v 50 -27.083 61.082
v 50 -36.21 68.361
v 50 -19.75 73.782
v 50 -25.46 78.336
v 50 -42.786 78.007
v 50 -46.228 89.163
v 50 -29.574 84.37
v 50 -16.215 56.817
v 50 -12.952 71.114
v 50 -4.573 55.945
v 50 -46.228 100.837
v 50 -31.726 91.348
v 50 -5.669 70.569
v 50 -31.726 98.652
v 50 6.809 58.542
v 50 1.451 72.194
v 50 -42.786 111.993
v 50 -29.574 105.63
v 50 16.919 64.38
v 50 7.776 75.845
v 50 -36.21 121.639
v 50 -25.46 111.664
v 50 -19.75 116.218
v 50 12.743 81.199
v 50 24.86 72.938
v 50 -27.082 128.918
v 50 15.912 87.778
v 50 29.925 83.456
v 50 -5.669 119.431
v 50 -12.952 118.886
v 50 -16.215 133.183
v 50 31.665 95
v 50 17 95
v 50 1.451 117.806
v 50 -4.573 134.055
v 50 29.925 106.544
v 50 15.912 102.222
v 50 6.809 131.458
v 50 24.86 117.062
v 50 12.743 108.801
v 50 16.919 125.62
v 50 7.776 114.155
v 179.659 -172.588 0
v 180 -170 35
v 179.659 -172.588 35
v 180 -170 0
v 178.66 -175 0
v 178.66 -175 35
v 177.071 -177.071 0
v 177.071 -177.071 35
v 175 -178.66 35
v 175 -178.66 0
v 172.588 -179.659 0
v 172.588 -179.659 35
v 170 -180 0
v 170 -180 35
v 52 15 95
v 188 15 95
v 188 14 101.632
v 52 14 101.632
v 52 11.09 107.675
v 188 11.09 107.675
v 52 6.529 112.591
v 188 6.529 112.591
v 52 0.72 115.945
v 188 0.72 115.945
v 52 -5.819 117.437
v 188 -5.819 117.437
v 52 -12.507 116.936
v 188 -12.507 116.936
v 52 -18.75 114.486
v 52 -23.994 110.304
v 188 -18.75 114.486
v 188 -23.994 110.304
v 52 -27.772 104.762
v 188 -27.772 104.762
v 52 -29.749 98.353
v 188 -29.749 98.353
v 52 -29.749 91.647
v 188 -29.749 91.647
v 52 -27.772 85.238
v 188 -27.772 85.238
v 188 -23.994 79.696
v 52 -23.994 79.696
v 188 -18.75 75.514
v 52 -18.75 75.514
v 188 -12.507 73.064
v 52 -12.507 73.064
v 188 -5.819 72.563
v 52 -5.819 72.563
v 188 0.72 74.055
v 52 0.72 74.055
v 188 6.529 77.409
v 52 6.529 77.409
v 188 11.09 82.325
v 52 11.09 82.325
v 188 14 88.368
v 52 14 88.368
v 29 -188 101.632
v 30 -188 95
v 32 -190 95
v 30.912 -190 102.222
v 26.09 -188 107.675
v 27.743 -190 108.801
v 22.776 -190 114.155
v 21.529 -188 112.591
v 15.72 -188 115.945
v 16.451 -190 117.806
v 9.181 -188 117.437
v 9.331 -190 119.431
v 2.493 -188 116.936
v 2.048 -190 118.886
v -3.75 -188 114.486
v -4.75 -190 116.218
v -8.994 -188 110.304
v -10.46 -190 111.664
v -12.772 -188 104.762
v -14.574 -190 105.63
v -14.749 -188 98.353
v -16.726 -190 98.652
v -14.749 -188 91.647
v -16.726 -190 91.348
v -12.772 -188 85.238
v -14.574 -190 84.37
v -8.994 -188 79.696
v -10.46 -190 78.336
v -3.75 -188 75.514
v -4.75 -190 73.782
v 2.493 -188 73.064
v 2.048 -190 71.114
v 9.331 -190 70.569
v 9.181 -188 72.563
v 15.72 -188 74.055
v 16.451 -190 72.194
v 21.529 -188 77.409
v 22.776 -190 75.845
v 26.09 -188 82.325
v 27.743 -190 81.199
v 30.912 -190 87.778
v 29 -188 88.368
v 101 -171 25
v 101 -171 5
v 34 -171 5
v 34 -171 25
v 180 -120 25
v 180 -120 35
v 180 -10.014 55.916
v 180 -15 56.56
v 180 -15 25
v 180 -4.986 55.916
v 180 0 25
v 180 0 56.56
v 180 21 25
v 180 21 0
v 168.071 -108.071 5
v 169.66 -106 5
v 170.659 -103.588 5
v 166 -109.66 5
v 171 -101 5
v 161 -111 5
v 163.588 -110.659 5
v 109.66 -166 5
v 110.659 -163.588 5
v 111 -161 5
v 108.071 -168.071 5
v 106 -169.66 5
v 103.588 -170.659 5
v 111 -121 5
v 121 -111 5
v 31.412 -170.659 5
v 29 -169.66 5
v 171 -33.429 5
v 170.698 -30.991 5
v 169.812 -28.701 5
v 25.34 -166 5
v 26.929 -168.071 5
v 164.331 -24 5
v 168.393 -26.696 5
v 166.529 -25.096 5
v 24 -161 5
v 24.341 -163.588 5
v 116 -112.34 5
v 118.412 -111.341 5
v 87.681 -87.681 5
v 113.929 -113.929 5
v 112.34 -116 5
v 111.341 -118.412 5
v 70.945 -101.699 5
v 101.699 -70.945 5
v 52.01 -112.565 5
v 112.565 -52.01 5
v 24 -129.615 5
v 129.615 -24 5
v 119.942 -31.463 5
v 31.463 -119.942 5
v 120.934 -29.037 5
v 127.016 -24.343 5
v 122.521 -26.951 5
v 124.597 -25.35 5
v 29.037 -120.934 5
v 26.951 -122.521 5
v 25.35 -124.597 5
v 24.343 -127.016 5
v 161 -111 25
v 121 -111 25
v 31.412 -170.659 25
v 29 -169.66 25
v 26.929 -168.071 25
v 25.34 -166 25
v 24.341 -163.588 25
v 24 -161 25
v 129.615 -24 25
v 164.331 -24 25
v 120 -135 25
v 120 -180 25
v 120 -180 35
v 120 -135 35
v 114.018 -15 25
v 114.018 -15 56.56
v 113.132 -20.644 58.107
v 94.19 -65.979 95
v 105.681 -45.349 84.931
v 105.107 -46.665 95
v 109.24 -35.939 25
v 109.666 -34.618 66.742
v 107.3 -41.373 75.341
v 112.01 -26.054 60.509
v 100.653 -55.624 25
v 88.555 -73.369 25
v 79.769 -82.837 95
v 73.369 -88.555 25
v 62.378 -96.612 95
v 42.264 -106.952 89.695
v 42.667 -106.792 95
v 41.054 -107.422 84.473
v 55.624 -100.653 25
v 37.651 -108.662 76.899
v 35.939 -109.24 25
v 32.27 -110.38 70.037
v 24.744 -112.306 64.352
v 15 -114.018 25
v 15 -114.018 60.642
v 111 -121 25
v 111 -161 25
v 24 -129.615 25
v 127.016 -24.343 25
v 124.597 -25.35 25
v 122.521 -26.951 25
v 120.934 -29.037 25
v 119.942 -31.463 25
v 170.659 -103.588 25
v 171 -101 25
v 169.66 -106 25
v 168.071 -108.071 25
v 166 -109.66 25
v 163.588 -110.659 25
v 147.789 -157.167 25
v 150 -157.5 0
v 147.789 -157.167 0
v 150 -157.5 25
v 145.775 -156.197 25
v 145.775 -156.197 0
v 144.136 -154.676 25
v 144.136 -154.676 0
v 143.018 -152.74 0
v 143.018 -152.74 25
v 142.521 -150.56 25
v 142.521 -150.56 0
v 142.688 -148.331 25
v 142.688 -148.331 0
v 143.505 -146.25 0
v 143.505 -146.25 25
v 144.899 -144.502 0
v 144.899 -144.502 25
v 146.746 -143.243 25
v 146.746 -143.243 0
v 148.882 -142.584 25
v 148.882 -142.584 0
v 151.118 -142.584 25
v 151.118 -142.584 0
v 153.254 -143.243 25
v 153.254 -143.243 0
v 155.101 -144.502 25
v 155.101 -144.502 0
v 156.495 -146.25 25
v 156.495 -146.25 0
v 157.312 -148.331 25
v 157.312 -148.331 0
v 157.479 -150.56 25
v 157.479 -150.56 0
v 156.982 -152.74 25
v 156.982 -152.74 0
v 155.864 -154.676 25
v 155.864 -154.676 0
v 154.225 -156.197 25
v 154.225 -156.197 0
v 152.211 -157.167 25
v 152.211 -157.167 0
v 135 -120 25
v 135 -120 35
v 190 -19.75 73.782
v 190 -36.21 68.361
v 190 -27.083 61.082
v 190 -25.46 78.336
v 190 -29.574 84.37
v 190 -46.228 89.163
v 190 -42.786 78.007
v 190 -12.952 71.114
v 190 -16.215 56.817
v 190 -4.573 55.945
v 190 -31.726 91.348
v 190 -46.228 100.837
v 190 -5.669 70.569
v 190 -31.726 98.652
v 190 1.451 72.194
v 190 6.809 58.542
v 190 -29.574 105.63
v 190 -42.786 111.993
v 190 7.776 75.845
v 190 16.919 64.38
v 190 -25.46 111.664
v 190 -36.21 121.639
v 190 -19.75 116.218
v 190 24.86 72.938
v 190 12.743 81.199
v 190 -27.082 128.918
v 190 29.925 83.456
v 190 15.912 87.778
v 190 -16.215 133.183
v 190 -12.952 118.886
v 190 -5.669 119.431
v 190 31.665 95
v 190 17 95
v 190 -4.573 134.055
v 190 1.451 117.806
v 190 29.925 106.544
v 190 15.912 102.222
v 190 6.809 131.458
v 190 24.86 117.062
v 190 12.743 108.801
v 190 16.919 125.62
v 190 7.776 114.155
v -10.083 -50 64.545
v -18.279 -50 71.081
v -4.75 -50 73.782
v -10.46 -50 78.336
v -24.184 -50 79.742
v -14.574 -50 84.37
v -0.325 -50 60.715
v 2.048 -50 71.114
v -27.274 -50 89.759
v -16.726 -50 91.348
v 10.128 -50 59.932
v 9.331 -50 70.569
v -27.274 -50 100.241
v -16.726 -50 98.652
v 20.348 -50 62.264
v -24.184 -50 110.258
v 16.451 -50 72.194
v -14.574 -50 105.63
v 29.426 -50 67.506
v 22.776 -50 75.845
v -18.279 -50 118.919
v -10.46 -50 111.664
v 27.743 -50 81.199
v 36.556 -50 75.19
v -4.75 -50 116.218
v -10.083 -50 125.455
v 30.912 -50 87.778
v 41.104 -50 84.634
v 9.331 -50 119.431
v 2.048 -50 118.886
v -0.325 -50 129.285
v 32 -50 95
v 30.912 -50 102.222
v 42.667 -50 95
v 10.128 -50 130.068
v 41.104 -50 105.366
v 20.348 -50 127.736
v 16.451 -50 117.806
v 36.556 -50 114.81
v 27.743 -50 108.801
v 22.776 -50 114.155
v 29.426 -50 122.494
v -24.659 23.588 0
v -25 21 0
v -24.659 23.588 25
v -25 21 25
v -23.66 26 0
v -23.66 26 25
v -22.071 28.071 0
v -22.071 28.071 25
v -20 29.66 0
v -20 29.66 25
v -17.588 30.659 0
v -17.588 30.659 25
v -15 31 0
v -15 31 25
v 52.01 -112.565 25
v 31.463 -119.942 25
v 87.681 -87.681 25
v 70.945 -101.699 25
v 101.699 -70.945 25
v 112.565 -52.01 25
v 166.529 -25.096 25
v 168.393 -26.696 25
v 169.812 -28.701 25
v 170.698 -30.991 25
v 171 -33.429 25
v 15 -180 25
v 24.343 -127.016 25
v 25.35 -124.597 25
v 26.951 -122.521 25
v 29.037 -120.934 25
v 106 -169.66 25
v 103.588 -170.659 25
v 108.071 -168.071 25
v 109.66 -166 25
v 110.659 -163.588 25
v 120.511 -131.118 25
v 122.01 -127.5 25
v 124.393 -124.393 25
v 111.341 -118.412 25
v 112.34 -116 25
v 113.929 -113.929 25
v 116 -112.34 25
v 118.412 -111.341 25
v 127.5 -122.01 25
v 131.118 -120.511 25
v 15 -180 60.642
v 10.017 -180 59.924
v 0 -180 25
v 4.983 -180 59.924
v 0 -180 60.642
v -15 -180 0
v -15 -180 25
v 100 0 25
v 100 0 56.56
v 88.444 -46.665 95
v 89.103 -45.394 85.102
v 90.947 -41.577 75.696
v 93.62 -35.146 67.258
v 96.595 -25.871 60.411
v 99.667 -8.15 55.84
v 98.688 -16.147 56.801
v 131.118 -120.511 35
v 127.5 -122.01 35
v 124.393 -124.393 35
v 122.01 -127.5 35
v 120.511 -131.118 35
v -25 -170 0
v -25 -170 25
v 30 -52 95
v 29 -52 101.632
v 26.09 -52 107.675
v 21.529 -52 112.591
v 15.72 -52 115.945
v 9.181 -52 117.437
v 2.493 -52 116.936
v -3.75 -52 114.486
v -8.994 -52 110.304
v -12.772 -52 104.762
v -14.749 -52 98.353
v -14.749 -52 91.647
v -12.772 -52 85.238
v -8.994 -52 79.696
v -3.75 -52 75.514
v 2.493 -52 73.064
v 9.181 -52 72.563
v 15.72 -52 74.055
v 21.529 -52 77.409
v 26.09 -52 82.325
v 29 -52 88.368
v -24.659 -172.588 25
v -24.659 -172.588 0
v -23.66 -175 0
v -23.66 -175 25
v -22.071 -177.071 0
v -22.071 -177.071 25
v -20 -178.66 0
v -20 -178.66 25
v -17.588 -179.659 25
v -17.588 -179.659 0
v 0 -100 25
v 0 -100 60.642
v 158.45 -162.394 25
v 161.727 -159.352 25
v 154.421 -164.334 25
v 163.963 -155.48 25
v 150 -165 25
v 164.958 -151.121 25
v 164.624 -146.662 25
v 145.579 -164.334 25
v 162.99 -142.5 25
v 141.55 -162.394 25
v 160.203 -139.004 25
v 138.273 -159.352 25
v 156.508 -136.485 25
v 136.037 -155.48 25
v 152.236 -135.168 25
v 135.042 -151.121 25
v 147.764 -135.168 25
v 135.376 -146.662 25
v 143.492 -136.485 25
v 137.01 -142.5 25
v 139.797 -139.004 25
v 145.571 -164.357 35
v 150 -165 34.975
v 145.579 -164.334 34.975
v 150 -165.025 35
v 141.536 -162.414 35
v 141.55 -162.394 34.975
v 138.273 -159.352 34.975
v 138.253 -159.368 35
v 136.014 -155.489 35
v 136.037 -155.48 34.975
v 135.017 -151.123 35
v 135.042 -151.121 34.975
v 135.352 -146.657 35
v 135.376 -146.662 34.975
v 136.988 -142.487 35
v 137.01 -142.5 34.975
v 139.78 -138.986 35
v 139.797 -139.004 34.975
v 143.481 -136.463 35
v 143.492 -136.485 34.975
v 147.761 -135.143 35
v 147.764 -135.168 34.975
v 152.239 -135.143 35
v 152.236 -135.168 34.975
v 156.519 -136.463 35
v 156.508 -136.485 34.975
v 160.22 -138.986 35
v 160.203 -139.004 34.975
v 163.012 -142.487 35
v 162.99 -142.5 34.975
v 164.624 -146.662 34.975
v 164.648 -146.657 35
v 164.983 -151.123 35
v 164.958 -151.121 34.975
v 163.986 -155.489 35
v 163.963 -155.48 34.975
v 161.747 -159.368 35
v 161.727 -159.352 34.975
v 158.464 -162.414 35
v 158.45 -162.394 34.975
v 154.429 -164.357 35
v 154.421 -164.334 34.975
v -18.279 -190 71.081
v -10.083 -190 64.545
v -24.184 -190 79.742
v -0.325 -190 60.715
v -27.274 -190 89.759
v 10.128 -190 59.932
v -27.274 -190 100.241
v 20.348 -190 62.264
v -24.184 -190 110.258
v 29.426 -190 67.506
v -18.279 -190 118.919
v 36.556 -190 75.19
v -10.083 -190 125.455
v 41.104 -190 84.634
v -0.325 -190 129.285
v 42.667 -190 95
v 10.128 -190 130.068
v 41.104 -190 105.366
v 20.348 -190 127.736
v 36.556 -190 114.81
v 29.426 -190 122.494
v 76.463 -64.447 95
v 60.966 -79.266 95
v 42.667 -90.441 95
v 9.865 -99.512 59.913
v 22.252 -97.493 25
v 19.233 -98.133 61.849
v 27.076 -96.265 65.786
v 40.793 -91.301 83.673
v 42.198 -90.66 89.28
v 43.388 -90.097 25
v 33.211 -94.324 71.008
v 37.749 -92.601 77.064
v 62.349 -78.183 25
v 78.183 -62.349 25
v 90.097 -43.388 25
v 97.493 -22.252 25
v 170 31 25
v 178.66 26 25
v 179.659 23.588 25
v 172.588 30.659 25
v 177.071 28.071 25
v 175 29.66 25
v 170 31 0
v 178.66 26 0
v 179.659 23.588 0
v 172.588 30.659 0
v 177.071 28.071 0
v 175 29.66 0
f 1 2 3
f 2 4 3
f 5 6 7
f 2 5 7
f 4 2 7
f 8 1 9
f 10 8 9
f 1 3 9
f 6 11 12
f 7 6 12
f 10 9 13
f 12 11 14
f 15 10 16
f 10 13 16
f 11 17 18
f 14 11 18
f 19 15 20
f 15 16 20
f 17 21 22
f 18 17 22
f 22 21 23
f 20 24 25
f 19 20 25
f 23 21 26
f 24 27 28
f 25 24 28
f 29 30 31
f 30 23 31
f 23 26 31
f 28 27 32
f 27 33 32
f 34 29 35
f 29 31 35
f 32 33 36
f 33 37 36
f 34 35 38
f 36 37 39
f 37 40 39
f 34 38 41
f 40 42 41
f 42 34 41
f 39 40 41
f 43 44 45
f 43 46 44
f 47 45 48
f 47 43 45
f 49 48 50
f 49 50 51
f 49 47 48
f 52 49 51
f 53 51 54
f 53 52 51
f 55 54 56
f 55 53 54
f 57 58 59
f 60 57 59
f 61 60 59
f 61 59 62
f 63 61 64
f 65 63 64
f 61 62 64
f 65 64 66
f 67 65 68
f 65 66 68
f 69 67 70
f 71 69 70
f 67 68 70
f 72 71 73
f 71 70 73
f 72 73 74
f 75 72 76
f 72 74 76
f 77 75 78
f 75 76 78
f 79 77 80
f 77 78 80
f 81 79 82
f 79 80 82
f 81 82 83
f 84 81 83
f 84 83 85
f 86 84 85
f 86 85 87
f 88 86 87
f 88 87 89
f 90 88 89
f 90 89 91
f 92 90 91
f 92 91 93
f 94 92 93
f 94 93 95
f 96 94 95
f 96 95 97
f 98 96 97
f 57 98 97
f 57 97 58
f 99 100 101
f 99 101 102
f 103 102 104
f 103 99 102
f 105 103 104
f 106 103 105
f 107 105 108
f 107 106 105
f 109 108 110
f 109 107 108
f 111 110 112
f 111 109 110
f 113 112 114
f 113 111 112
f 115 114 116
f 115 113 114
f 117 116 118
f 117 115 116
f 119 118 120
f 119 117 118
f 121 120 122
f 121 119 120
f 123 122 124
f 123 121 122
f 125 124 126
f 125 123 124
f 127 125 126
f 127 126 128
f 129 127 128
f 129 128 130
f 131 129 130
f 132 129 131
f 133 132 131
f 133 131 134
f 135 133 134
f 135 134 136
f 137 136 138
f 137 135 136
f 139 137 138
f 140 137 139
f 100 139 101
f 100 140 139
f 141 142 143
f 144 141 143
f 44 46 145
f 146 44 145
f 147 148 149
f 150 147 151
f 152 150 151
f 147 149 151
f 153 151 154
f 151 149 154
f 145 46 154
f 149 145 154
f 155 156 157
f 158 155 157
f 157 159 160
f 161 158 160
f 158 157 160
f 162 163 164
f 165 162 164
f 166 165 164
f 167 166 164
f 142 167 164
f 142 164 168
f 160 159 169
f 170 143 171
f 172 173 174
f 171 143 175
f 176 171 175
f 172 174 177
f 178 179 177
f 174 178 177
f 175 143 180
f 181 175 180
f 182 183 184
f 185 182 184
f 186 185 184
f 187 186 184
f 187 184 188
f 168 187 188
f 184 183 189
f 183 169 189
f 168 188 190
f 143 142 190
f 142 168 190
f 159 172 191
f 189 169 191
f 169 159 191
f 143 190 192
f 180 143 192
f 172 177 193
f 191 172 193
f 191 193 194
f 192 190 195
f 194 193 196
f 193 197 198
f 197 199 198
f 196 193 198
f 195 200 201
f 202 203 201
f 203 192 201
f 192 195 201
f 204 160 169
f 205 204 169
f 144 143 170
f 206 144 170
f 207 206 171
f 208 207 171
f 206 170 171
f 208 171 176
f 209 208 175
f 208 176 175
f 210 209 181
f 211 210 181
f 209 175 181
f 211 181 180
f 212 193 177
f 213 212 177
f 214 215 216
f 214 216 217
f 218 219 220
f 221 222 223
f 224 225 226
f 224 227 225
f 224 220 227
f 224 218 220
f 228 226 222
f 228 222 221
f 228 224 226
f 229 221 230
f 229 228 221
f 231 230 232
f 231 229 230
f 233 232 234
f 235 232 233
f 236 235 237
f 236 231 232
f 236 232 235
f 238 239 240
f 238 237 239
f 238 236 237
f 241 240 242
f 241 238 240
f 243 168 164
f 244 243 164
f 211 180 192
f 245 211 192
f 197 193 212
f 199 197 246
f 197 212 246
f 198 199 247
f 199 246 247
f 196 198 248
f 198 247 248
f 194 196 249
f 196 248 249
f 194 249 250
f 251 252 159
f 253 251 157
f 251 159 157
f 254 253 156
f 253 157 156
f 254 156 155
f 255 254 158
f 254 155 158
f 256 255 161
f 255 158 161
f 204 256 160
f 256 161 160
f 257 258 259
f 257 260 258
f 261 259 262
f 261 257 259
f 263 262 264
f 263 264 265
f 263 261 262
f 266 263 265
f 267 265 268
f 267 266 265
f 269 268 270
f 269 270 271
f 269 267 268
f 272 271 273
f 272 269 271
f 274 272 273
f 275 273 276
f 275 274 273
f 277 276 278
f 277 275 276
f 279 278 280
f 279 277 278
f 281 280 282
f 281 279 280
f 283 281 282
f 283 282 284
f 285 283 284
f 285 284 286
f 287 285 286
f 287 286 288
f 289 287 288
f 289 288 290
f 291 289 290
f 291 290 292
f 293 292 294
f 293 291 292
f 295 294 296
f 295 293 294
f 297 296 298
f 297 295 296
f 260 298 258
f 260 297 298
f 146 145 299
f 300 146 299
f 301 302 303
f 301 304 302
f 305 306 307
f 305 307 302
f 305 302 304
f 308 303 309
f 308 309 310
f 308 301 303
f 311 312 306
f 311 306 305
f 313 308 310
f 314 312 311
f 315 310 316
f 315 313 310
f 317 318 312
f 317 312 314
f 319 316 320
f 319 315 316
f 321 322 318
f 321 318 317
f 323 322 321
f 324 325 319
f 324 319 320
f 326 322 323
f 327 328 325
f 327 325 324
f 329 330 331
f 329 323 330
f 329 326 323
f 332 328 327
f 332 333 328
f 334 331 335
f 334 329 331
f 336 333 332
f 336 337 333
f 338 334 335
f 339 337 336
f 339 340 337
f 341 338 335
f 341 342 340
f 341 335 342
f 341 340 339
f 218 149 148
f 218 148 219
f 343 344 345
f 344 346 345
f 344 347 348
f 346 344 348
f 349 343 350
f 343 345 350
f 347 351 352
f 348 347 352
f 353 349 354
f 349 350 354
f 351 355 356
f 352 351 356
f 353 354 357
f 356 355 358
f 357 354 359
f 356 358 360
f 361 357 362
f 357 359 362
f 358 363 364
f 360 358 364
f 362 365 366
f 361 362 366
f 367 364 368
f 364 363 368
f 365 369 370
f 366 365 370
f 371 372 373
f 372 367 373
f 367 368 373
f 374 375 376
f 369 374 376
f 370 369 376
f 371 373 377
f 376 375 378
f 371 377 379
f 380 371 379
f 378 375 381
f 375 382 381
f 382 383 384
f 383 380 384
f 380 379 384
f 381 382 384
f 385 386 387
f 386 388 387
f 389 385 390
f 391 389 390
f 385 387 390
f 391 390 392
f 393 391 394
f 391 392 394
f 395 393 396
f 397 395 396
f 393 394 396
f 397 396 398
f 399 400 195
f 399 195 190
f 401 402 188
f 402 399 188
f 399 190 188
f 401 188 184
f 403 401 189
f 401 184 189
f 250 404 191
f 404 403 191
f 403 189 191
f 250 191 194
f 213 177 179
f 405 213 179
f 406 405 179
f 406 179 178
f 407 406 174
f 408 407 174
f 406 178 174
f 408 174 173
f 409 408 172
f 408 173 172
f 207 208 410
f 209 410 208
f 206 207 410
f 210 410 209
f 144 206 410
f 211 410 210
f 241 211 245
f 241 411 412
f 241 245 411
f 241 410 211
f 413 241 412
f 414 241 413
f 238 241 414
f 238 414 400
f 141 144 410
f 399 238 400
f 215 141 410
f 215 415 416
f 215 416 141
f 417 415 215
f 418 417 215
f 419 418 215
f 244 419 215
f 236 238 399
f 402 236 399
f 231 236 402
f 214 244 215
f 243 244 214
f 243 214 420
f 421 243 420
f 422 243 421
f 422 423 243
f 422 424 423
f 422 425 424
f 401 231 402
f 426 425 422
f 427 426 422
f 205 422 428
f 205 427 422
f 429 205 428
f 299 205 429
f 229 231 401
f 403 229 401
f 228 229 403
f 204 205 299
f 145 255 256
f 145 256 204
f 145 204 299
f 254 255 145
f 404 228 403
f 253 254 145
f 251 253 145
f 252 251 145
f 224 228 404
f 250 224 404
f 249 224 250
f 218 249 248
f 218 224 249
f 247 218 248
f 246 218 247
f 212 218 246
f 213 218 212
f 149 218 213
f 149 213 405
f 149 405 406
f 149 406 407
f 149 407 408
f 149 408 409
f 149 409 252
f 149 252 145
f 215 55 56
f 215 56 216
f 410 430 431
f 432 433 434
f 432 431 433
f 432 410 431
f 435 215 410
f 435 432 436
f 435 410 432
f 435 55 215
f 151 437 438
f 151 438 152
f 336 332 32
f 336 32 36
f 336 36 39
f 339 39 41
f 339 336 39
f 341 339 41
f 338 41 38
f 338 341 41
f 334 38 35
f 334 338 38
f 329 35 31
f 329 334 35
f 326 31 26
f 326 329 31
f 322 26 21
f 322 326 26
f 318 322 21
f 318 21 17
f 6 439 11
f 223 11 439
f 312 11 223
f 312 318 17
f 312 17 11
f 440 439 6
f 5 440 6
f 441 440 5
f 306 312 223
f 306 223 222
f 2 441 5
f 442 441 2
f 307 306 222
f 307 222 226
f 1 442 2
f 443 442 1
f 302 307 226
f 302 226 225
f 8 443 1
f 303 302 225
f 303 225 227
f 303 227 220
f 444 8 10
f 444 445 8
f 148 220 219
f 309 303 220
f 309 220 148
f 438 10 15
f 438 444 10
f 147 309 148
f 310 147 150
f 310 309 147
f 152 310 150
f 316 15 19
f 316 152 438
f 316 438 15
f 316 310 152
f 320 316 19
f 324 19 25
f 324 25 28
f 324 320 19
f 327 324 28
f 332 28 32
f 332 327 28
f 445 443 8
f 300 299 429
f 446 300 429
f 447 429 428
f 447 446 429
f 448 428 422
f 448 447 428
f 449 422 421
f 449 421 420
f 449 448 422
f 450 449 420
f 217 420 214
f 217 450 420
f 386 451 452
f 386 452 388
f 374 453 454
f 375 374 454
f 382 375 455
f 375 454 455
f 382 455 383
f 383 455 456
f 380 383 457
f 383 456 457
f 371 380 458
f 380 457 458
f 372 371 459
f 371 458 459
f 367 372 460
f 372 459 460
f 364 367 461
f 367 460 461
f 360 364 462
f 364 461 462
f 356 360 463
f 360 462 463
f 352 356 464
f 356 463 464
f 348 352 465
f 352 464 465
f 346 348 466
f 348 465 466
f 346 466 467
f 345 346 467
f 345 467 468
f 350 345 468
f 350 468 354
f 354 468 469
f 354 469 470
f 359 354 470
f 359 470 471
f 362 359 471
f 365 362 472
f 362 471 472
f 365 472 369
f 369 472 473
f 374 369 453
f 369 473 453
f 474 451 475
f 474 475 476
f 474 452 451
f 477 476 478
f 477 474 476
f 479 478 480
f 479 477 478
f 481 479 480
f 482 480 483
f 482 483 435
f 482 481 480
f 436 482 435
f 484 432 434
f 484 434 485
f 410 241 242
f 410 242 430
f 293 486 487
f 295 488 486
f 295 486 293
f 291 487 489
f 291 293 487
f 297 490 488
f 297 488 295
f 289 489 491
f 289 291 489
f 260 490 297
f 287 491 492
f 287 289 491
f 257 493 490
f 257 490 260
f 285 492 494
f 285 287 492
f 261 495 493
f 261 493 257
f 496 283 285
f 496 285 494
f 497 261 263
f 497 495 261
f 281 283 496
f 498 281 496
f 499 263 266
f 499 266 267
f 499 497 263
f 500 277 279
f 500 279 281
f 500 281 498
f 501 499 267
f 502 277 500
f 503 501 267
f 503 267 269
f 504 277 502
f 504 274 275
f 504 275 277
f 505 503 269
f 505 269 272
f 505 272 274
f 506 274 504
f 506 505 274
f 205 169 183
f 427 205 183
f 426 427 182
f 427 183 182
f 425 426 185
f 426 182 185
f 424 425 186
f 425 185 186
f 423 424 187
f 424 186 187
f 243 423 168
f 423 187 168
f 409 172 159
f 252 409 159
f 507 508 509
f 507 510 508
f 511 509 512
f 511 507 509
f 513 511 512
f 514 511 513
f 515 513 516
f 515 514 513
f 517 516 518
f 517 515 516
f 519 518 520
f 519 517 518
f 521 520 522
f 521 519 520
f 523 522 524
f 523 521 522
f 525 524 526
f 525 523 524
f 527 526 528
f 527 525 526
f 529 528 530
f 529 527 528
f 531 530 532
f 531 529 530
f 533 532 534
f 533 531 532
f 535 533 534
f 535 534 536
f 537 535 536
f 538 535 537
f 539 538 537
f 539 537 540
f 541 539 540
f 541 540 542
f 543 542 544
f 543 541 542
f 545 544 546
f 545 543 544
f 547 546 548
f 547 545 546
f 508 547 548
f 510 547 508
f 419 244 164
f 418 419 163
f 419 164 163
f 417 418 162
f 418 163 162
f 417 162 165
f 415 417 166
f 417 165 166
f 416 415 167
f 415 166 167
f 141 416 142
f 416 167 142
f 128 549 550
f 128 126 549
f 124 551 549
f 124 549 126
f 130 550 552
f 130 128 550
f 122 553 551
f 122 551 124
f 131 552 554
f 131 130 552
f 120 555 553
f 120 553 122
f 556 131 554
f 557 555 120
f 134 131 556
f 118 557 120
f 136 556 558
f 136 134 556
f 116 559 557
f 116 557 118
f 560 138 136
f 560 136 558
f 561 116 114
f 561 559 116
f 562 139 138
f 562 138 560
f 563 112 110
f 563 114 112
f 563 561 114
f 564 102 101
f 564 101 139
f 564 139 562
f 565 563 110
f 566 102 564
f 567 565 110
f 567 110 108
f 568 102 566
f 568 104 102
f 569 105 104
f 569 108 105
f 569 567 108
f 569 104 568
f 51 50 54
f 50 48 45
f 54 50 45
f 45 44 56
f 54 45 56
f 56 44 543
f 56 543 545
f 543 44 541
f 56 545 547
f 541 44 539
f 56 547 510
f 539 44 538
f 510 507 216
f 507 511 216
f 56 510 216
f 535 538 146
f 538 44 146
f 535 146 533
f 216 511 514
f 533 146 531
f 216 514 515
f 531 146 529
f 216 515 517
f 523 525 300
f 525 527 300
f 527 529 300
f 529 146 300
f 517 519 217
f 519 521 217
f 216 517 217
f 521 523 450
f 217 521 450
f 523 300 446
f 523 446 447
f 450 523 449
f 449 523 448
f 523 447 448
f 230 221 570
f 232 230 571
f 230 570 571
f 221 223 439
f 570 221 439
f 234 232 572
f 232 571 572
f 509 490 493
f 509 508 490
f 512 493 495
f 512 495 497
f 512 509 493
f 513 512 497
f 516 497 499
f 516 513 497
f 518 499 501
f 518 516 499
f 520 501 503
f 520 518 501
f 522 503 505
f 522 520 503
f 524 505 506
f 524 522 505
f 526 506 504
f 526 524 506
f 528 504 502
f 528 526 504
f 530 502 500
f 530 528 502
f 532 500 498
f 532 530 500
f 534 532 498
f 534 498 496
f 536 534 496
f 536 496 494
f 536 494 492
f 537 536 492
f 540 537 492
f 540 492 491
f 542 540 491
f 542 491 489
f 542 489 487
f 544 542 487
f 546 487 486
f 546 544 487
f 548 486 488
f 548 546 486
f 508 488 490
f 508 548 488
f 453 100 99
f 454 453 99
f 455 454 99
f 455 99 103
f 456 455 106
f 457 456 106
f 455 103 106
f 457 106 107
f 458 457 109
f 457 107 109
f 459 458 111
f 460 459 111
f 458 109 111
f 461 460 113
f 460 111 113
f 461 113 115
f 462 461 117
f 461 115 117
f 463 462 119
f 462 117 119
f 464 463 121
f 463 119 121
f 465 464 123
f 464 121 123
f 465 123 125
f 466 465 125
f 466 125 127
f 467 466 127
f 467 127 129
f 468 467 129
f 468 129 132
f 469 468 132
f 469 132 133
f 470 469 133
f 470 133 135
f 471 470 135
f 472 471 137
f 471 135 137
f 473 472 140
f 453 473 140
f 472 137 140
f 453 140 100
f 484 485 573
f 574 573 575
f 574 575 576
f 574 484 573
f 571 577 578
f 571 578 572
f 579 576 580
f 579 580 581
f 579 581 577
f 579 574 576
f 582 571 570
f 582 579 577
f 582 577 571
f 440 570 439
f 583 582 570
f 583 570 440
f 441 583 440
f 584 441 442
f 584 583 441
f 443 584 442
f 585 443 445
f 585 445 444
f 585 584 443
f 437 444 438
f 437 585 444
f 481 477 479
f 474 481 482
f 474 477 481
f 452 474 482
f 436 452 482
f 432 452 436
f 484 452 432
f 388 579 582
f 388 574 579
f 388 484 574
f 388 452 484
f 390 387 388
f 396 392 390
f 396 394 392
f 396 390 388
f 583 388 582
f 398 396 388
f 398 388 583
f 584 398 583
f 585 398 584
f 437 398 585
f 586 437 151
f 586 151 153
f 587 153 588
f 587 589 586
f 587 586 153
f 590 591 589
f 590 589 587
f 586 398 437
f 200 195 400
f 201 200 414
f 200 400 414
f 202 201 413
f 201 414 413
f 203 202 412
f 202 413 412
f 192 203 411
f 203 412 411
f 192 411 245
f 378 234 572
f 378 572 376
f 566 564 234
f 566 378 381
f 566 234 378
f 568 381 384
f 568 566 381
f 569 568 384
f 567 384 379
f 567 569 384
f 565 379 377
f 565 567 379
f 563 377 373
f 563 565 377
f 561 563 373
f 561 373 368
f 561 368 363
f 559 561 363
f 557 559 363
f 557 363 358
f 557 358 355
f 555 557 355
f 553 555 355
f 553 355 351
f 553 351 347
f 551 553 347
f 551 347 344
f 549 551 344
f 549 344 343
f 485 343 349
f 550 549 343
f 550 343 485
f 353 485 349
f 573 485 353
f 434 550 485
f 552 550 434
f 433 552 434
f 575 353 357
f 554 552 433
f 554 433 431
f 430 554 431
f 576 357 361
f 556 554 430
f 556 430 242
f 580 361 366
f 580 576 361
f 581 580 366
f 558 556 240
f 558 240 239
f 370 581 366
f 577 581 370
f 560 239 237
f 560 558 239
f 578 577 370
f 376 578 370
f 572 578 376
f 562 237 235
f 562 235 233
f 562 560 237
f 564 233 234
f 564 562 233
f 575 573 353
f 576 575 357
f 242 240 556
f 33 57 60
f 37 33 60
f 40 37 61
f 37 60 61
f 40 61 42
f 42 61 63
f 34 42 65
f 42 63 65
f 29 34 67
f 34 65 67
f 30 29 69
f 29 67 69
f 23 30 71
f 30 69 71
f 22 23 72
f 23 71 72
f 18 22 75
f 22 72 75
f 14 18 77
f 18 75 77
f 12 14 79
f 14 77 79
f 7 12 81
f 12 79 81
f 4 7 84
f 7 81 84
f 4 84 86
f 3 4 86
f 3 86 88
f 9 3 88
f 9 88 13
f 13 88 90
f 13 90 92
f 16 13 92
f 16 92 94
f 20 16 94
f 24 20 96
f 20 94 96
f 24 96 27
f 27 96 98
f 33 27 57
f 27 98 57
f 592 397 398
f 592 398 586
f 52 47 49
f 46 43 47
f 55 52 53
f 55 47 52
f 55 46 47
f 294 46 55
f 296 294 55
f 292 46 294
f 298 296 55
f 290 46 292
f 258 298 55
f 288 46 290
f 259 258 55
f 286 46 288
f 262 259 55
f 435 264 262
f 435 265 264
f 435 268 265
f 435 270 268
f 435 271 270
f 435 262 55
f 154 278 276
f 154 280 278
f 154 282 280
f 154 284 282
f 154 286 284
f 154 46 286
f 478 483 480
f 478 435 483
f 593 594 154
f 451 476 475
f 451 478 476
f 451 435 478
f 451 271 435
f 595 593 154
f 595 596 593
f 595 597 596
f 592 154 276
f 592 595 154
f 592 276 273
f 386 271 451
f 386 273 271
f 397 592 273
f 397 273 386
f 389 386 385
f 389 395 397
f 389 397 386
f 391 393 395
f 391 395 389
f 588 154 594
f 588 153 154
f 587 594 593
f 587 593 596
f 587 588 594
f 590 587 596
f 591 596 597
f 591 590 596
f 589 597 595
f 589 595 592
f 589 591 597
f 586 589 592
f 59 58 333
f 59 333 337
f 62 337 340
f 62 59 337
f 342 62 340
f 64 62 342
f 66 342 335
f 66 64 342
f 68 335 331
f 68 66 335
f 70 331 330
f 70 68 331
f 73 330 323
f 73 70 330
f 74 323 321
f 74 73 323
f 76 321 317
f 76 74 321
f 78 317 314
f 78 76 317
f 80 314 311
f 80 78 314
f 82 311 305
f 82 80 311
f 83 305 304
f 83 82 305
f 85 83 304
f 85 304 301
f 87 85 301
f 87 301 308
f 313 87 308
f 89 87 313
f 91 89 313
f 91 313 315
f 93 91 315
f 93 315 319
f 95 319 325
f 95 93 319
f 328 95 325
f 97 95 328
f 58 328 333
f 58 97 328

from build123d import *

# Parameters (mm, degrees)
SKETCH1_W               = 205
SKETCH1_H               = 211
BOSS_EXTRUDE1_DEPTH     = 25
BOSS_EXTRUDE2_START     = -25
SKETCH2_W               = 60
SKETCH2_H               = 60
BOSS_EXTRUDE2_DEPTH     = 10
FILLET1_R               = 10
BOSS_EXTRUDE3_DEPTH     = 95
BOSS_EXTRUDE4_START     = 10
SKETCH5_R               = 35.166666667
BOSS_EXTRUDE4_DEPTH     = 140
SKETCH6_R               = 22.5
CUT_EXTRUDE1_DEPTH      = 140
BOSS_EXTRUDE5_START     = 10
SKETCH7_R               = 39.165
BOSS_EXTRUDE5_DEPTH     = 140
SKETCH8_R               = 22.5
CUT_EXTRUDE2_DEPTH      = 319.557726497
CUT_EXTRUDE5_DEPTH      = 35
CUT_EXTRUDE5_DEPTH_BACK = 15
CUT_EXTRUDE5_START      = -5
FILLET2_R               = 15
FILLET3_R               = 10
CHAMFER1_SIZE           = 2
CHAMFER2_SIZE           = 2


with BuildPart() as part:
    # Sketch1 → Boss-Extrude1 (new body)
    with BuildSketch(Plane.XY):
        with Locations((77.5, -74.5)):
            Rectangle(SKETCH1_W, SKETCH1_H)
    extrude(amount=BOSS_EXTRUDE1_DEPTH)

    # Sketch2 → Boss-Extrude2 (add)
    with BuildSketch(Plane(origin=(0, 0, 0), x_dir=(-1, 0, 0), z_dir=(0, 0, -1)).offset(BOSS_EXTRUDE2_START)):
        with Locations((-150, -150)):
            Rectangle(SKETCH2_W, SKETCH2_H)
    extrude(amount=-BOSS_EXTRUDE2_DEPTH)

    # Fillet1
    fillet1_edges = [part.edges().sort_by_distance(p)[0] for p in [
        (-25, 31, 12.5),
        (180, 31, 12.5),
        (180, -180, 17.5),
        (-25, -180, 12.5),
    ]]
    fillet(fillet1_edges, radius=FILLET1_R)

    # Sketch4 → Boss-Extrude3 (add)
    with BuildSketch(Plane.XY):
        with BuildLine():
            Line((0, -180), (0, -100))
            ThreePointArc((0, -100), (70.710678119, -70.710678119), (100, 0))
            Line((100, 0), (180, 0))
            Line((180, 0), (180, -15))
            Line((180, -15), (114.01754251, -15))
            ThreePointArc((114.01754251, -15), (81.317279836, -81.317279836), (15, -114.01754251))
            Line((15, -114.01754251), (15, -180))
            Line((15, -180), (0, -180))
        make_face()
    extrude(amount=BOSS_EXTRUDE3_DEPTH)

    # Sketch5 → Boss-Extrude4 (add)
    with BuildSketch(Plane.XZ.offset(180).offset(BOSS_EXTRUDE4_START)):
        with Locations((7.5, 95)):
            Circle(SKETCH5_R)
    extrude(amount=-BOSS_EXTRUDE4_DEPTH)

    # Sketch6 → Cut-Extrude1 (cut)
    with BuildSketch(Plane.XZ.offset(190)):
        with Locations((7.5, 95)):
            Circle(SKETCH6_R)
    extrude(amount=-CUT_EXTRUDE1_DEPTH, mode=Mode.SUBTRACT)

    # Sketch7 → Boss-Extrude5 (add)
    with BuildSketch(Plane(origin=(180, 0, 0), x_dir=(0, 0, -1), z_dir=(1, 0, 0)).offset(BOSS_EXTRUDE5_START)):
        with Locations(Location((-95, -7.5, 0), (0, 0, 90))):
            Circle(SKETCH7_R)
    extrude(amount=-BOSS_EXTRUDE5_DEPTH)

    # Sketch8 → Cut-Extrude2 (cut, through all)
    with BuildSketch(Plane(origin=(190, 0, 0), x_dir=(0, 0, -1), z_dir=(1, 0, 0))):
        with Locations(Location((-95, -7.5, 0), (0, 0, 90))):
            Circle(SKETCH8_R)
    extrude(amount=-CUT_EXTRUDE2_DEPTH, mode=Mode.SUBTRACT)

    # Sketch10 → Cut-Extrude5 (cut, two sides: drawn at the far end of the back side and taken through both)
    with BuildSketch(Plane.XY.offset(25).offset(CUT_EXTRUDE5_START - CUT_EXTRUDE5_DEPTH_BACK)):
        with BuildLine():
            Line((171, -33.428803755), (171, -101))
            ThreePointArc((171, -101), (168.071067812, -108.071067812), (161, -111))
            Line((161, -111), (121, -111))
            ThreePointArc((121, -111), (113.928932188, -113.928932188), (111, -121))
            Line((111, -121), (111, -161))
            ThreePointArc((111, -161), (108.071067812, -168.071067812), (101, -171))
            Line((101, -171), (34, -171))
            ThreePointArc((34, -171), (26.928932188, -168.071067812), (24, -161))
            Line((24, -161), (24, -136.527840403))
            Line((24, -136.527840403), (24, -121.655250606))
            ThreePointArc((24, -121.655250606), (87.681240867, -87.681240867), (121.655250606, -24))
            Line((121.655250606, -24), (132.503249765, -24))
            Line((132.503249765, -24), (164.331315018, -24))
            ThreePointArc((164.331315018, -24), (169.164347806, -27.654427173), (171, -33.428803755))
        make_face()
    extrude(amount=CUT_EXTRUDE5_DEPTH + CUT_EXTRUDE5_DEPTH_BACK, mode=Mode.SUBTRACT)

    # Sketch15 → CBORE for M8 Hex Head Bolt2 (revolve, cut)
    with BuildSketch(Plane(origin=(150, -150, 35), x_dir=(0, -1, 0), z_dir=(1, 0, 0))):
        Polygon((0, 0), (0, 35), (7.5, 35), (7.5, 10), (15, 10), (15, 0.025), (15.025, 0), align=None)
    revolve(axis=Axis((150, -150, 41.35), (0, 0, -1)), mode=Mode.SUBTRACT)

    # Fillet2
    fillet2_edges = [part.edges().sort_by_distance(p)[0] for p in [
        (120, -120, 30),
    ]]
    fillet(fillet2_edges, radius=FILLET2_R)

    # Fillet3
    fillet3_edges = [part.edges().sort_by_distance(p)[0] for p in [
        (24, -121.655250606, 15),
        (121.655250606, -24, 15),
    ]]
    fillet(fillet3_edges, radius=FILLET3_R)

    # Chamfer1
    chamfer1_edges = [part.edges().sort_by_distance(p)[0] for p in [
        (-15, -50, 95),
        (-15, -190, 95),
    ]]
    chamfer(chamfer1_edges, length=CHAMFER1_SIZE)

    # Chamfer2
    chamfer2_edges = [part.edges().sort_by_distance(p)[0] for p in [
        (50, -30, 95),
        (190, -30, 95),
    ]]
    chamfer(chamfer2_edges, length=CHAMFER2_SIZE)


solid = part.part
